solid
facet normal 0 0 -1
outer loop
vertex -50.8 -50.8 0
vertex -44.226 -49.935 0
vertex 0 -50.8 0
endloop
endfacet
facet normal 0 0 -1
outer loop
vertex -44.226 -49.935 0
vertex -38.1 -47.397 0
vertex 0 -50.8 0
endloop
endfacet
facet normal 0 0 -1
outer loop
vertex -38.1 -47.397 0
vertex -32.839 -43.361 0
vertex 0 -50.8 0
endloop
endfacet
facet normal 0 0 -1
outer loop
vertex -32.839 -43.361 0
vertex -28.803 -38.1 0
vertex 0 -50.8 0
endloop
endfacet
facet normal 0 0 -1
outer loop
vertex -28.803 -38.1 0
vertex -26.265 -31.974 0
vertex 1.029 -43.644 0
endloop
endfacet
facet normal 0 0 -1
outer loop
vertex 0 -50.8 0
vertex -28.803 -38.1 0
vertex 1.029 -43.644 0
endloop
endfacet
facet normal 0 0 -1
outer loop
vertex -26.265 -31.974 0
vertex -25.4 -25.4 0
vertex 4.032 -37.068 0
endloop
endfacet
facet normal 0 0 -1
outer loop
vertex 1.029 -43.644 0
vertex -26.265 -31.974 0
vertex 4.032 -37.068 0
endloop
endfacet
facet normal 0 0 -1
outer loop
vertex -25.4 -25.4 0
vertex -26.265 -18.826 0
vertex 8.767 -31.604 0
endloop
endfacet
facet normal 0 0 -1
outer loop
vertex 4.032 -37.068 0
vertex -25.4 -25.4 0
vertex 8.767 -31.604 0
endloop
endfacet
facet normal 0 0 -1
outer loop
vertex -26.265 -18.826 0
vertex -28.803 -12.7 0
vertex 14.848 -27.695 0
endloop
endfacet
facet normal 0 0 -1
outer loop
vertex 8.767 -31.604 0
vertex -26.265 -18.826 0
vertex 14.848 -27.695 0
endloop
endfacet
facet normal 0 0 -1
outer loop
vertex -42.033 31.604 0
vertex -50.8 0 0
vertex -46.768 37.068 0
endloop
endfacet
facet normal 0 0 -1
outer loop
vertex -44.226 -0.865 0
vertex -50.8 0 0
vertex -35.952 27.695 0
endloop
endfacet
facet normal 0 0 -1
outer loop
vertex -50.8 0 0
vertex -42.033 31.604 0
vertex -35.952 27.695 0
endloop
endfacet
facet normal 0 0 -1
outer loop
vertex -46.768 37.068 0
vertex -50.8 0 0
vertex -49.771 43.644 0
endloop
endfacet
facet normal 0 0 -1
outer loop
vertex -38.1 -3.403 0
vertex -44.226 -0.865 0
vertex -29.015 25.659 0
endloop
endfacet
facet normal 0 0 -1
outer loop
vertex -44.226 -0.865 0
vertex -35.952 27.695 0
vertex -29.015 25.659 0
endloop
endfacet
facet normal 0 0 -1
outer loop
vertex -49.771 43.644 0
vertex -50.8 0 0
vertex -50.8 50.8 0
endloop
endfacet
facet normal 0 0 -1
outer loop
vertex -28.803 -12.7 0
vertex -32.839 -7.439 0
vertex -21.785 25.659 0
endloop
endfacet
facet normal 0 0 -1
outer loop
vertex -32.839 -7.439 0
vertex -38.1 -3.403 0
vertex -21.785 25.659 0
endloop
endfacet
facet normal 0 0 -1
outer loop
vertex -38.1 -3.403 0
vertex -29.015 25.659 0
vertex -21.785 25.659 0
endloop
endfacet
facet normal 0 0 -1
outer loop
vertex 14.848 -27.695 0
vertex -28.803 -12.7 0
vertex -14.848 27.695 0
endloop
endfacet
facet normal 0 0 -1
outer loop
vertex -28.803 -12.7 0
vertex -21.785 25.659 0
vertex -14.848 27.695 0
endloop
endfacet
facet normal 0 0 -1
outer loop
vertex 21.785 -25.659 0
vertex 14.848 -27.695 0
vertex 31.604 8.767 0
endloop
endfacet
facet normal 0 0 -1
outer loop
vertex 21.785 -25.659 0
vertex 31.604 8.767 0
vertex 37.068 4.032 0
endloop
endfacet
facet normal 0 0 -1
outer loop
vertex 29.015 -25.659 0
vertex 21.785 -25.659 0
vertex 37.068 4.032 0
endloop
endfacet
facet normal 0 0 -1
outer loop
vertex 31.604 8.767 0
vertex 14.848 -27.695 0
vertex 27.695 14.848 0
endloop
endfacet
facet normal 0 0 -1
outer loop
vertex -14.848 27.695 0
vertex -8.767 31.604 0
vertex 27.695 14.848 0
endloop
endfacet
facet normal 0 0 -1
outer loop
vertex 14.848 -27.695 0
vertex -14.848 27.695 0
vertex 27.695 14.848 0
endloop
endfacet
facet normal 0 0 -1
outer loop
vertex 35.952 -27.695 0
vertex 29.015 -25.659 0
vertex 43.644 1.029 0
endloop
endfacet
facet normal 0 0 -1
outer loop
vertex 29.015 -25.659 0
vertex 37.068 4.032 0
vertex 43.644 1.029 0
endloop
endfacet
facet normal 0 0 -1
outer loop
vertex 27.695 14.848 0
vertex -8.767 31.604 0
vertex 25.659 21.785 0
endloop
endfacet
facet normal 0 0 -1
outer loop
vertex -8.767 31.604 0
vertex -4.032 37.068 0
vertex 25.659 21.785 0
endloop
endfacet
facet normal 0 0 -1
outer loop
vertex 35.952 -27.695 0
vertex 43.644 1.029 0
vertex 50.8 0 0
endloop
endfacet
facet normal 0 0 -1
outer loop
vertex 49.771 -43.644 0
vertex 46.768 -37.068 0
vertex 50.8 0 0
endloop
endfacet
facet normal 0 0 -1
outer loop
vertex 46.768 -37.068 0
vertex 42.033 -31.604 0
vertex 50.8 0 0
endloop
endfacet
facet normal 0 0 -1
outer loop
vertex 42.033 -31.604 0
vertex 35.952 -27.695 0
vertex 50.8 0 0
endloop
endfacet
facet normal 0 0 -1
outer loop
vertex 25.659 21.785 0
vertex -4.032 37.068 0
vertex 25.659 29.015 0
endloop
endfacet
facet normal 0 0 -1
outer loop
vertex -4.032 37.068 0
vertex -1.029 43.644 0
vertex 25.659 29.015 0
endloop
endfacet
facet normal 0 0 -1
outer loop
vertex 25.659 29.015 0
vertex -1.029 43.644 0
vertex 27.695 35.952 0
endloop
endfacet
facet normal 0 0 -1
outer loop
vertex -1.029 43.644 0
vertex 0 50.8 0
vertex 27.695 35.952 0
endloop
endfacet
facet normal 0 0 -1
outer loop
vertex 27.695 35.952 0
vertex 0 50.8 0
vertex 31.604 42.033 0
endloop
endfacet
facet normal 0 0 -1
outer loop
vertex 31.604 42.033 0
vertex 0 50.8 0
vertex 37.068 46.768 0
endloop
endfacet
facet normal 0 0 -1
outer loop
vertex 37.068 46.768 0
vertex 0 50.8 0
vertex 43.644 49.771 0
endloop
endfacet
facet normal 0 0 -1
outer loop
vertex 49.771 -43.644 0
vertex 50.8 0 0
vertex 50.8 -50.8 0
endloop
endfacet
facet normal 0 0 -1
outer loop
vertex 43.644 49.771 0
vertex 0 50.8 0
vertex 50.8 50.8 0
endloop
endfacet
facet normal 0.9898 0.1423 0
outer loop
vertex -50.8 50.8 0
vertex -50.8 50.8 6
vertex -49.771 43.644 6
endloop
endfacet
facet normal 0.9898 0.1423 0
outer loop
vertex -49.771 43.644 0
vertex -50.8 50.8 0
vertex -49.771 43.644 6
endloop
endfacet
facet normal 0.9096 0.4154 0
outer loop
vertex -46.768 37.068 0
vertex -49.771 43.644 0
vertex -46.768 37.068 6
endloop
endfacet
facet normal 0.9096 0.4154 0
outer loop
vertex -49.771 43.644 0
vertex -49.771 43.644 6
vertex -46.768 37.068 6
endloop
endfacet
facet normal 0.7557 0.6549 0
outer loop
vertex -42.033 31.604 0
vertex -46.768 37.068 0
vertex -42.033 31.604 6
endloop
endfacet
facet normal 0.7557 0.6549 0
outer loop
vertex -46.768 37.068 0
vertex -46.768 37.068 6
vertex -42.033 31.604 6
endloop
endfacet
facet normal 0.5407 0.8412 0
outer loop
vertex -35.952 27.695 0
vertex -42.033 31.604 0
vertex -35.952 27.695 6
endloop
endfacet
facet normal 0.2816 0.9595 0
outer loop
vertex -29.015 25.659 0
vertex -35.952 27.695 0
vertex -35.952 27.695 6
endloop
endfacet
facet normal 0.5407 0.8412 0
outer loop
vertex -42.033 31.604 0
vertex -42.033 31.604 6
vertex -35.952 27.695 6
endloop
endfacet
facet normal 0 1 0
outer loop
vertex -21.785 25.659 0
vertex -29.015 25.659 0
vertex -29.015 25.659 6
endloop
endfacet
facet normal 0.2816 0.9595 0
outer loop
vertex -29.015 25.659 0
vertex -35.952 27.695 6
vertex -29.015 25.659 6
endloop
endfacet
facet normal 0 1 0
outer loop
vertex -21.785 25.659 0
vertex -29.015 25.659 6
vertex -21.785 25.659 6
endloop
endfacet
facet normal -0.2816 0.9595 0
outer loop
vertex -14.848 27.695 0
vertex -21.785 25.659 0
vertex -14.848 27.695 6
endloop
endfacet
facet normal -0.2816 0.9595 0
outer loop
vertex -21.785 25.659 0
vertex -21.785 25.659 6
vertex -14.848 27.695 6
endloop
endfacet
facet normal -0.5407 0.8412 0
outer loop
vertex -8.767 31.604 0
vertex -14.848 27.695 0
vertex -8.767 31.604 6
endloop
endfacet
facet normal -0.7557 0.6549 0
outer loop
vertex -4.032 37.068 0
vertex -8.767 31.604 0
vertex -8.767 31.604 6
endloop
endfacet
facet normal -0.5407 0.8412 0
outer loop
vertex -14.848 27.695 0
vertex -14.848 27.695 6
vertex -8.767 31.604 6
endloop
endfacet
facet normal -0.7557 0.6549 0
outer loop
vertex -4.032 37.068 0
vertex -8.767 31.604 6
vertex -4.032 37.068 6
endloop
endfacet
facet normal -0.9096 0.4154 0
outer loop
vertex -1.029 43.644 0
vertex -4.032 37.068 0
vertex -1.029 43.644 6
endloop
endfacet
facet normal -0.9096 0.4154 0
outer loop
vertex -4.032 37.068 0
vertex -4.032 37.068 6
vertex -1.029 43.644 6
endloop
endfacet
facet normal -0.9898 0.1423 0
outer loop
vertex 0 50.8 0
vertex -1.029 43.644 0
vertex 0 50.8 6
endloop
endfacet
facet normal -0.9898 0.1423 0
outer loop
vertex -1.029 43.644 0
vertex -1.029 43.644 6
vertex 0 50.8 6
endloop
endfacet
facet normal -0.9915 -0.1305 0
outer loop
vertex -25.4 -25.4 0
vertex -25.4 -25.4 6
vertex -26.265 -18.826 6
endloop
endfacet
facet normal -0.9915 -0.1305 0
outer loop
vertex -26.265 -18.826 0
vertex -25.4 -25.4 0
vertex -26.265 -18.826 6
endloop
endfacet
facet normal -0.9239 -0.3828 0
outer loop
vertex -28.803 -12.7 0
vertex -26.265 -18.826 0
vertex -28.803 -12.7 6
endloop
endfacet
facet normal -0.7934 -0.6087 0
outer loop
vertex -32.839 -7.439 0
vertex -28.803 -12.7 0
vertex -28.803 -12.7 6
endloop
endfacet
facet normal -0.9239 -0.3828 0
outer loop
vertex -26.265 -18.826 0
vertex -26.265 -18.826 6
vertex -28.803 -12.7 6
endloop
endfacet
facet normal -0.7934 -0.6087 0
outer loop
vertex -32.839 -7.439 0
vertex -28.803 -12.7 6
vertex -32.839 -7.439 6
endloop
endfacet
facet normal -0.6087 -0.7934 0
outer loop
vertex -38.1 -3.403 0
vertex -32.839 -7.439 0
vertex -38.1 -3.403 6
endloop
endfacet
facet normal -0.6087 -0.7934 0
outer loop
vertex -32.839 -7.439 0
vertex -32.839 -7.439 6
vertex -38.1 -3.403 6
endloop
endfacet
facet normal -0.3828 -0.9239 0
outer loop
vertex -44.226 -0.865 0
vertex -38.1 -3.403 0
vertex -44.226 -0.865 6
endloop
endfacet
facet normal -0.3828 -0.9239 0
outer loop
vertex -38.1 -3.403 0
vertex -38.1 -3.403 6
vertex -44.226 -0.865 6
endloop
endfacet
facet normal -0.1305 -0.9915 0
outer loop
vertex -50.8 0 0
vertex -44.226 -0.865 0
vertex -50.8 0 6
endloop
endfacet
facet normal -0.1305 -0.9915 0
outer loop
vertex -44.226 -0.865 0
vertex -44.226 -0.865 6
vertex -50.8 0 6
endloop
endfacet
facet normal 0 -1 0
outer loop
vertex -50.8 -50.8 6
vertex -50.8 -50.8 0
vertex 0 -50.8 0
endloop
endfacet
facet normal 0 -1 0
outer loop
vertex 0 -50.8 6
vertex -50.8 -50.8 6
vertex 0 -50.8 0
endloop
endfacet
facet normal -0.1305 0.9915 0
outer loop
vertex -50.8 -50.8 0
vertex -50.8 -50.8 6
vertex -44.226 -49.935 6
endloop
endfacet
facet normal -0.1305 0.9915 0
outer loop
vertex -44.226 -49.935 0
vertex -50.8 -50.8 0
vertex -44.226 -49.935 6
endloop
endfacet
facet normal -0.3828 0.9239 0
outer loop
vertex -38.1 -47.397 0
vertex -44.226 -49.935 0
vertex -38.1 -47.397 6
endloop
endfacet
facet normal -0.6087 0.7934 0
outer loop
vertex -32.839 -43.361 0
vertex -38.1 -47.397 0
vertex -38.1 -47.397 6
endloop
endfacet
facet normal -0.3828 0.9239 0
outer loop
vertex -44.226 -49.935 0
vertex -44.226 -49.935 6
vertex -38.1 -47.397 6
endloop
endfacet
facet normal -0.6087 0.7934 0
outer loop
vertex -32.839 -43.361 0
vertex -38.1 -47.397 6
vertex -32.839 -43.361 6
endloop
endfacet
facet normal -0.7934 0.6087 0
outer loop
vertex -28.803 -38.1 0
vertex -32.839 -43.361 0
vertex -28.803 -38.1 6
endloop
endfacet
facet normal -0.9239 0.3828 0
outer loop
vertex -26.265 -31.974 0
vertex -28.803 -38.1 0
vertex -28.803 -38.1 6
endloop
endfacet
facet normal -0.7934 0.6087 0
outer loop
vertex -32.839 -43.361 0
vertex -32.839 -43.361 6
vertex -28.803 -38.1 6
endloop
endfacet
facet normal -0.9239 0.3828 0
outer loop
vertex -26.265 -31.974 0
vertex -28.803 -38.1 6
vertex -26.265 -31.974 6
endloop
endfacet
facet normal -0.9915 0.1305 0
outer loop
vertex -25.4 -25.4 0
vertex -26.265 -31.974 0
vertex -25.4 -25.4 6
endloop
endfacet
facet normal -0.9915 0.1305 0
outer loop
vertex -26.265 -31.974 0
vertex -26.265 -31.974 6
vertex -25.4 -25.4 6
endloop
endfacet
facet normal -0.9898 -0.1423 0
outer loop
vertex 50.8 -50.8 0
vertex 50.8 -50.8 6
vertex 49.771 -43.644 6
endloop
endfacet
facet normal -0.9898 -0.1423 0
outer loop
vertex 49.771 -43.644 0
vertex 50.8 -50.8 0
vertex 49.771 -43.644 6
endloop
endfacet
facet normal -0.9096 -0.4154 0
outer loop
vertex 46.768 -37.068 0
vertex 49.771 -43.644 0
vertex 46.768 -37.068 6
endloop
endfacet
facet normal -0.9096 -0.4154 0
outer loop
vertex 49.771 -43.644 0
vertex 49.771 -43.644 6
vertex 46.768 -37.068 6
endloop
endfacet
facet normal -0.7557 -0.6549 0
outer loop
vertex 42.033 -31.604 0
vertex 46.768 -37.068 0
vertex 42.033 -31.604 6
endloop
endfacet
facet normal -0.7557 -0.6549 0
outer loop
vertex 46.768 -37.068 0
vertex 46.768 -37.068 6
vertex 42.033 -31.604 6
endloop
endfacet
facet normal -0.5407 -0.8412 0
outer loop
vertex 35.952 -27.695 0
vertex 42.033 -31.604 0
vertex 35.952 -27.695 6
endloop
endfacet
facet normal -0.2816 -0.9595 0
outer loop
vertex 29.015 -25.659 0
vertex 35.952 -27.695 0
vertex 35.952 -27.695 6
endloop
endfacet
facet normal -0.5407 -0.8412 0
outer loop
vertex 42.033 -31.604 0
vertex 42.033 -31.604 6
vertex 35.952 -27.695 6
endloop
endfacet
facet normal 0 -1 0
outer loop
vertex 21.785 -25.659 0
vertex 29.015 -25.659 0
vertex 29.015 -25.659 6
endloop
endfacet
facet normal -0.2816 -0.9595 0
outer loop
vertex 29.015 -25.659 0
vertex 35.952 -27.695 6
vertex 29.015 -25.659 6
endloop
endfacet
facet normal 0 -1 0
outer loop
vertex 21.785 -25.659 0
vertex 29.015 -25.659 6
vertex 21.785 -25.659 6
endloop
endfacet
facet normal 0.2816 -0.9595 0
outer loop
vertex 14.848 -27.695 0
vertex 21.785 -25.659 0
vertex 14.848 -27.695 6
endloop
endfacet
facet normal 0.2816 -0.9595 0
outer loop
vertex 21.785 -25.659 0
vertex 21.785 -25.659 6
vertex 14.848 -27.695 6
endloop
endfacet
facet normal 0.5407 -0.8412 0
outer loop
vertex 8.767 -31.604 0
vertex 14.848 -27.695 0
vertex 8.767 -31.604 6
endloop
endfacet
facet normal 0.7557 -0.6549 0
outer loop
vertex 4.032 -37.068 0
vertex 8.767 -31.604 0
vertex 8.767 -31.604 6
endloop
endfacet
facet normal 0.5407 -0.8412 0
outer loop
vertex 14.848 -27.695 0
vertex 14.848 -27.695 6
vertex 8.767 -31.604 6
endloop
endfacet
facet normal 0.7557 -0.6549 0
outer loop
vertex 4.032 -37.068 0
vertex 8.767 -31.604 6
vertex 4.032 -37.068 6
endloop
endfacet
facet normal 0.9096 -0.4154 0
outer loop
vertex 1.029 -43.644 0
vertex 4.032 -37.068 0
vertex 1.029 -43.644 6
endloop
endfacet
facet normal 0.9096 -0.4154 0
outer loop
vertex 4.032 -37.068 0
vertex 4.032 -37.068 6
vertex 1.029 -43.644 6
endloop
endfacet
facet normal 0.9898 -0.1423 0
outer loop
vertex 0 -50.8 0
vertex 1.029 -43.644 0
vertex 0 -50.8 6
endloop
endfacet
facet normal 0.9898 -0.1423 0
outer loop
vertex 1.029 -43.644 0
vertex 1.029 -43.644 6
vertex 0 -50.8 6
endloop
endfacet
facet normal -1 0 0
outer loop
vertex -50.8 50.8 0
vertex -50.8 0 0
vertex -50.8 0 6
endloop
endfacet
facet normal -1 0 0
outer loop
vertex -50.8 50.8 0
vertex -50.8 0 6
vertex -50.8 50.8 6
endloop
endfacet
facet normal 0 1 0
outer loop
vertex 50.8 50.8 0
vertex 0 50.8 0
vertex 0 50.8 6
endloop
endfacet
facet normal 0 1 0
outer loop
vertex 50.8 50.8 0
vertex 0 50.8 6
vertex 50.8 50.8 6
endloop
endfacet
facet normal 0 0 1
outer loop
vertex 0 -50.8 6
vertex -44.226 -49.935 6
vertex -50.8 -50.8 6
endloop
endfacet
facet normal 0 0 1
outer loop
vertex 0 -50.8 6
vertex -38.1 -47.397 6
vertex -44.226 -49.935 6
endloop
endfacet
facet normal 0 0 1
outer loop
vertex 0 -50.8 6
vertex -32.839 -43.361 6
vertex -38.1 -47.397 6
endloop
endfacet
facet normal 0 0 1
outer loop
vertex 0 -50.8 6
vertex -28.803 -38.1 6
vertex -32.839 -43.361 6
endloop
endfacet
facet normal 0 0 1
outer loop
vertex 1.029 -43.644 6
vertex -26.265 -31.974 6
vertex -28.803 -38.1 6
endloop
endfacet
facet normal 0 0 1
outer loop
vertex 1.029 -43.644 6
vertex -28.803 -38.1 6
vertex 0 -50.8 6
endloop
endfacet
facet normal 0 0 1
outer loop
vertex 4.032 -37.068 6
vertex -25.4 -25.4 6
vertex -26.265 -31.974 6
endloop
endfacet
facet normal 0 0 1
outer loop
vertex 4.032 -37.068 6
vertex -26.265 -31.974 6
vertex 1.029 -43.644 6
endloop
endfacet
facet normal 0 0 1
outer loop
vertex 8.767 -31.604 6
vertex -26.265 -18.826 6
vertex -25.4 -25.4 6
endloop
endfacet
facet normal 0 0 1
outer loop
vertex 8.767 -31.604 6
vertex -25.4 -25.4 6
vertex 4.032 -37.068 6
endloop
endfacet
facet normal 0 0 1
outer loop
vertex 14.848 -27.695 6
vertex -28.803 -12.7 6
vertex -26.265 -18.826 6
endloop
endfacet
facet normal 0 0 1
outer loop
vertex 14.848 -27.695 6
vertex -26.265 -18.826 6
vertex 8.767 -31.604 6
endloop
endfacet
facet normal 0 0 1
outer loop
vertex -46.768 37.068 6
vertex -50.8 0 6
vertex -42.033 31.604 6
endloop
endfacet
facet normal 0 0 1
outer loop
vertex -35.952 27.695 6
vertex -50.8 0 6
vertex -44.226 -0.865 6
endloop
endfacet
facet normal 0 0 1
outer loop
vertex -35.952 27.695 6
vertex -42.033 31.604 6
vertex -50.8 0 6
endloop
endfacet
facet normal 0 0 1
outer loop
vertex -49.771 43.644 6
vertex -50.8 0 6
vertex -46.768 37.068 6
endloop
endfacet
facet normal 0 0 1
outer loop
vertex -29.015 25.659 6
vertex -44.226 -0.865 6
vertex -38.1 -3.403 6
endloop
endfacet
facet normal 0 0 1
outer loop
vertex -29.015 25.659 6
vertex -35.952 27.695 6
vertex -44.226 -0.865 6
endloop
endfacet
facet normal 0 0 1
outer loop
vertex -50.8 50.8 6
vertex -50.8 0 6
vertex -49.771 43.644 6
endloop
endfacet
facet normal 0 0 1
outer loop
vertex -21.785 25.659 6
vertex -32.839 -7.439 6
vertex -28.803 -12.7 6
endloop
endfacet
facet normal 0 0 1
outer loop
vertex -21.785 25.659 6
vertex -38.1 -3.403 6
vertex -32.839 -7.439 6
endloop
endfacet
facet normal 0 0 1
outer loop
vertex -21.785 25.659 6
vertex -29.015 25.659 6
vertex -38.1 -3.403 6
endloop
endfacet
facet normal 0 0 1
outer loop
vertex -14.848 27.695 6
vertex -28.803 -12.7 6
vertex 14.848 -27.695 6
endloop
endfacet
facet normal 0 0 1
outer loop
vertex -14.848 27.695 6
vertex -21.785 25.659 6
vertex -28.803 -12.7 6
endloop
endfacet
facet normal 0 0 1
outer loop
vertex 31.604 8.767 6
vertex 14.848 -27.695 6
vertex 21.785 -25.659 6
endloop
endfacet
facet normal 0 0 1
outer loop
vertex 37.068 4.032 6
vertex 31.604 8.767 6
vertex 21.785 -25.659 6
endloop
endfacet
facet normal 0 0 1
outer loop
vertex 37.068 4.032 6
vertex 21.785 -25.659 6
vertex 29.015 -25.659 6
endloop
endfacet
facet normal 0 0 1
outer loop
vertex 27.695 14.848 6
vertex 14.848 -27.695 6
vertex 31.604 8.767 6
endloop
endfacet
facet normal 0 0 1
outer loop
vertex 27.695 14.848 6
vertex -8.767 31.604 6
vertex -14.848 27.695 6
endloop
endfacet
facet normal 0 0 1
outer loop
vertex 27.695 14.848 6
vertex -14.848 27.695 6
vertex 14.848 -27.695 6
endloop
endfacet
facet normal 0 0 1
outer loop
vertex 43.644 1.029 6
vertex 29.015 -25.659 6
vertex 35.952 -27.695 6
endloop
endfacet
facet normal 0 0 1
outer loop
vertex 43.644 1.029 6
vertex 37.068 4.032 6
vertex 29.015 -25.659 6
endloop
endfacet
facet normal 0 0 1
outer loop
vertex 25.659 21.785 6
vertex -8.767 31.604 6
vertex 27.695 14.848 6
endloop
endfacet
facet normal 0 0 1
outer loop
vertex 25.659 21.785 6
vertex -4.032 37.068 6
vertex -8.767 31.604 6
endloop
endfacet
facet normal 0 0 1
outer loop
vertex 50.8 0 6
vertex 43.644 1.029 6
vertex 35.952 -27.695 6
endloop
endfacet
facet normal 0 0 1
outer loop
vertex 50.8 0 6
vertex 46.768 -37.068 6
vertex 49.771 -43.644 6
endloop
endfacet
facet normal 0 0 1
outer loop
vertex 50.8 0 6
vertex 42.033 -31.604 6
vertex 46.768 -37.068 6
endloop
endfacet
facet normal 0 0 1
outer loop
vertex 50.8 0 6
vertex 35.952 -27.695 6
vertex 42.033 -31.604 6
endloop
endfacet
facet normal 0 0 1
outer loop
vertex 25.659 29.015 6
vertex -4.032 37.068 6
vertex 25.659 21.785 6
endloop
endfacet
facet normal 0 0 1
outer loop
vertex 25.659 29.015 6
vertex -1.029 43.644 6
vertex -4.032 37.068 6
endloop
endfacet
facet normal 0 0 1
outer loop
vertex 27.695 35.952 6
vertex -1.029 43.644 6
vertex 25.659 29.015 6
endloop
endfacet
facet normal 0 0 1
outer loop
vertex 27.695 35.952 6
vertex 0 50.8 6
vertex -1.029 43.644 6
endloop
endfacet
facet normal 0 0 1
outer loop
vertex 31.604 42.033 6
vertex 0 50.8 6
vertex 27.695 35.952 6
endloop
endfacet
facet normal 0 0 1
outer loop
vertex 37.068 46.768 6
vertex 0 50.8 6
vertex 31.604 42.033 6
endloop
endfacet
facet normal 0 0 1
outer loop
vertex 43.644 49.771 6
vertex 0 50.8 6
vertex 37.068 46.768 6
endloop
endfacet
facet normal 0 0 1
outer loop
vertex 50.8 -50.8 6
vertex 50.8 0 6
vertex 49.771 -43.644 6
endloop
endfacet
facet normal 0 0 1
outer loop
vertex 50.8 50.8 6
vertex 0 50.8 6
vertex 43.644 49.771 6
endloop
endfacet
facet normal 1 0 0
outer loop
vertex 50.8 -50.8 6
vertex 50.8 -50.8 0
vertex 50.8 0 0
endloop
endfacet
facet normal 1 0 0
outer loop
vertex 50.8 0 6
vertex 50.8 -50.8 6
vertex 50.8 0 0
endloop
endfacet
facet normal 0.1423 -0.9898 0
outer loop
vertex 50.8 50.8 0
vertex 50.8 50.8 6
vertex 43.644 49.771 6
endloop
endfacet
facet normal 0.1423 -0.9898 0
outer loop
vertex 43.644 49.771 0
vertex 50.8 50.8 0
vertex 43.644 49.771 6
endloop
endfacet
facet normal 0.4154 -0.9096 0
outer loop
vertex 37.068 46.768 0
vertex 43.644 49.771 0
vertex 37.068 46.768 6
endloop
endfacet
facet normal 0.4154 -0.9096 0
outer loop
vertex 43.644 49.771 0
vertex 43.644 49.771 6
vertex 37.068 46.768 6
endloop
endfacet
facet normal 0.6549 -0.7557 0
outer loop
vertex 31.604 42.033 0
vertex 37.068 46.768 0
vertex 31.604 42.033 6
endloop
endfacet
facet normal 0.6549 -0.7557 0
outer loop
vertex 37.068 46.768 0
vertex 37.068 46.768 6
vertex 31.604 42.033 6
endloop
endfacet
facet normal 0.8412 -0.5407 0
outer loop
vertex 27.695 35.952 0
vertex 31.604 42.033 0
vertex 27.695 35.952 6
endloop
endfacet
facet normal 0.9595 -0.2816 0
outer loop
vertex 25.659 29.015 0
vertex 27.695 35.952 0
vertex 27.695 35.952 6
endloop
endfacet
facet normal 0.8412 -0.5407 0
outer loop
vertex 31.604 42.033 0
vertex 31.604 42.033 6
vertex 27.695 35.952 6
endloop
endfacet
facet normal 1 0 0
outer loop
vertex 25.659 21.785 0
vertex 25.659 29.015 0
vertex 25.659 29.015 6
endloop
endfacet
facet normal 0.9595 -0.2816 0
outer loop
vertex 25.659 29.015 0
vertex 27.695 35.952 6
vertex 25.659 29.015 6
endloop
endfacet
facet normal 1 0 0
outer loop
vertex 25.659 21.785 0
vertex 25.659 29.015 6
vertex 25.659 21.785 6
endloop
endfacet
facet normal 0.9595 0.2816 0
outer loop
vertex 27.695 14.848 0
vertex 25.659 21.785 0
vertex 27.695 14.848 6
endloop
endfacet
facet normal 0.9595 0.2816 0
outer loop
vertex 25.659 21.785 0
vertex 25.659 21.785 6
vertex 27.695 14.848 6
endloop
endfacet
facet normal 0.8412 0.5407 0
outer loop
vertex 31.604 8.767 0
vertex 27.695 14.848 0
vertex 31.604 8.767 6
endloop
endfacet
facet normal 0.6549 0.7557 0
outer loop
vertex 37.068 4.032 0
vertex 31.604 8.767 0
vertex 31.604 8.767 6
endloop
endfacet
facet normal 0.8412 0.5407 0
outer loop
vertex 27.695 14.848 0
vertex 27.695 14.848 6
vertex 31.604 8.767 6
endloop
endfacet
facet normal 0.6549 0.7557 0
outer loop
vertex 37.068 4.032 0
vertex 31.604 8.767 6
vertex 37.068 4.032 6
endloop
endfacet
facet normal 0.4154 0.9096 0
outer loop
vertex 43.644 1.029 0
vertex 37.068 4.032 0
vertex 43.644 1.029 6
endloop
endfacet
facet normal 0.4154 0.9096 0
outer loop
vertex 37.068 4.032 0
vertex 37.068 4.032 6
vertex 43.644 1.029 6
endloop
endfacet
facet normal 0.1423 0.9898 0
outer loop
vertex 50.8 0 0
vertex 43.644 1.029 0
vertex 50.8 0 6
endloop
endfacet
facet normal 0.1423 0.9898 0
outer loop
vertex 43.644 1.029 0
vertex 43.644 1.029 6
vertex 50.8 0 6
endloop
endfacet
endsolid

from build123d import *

# Parameters (mm, degrees)
F0_W     = 101.6
F0_H     = 101.6
F1_DEPTH = 6
F3_DEPTH = 6.35


with BuildPart() as f1:
    # F0 (on Top) → F1 (new body)
    with BuildSketch(Plane.XY):
        Rectangle(F0_W, F0_H)
    extrude(amount=F1_DEPTH)

    # F2 (on face) → F3 (cut)
    with BuildSketch(Plane.XY.offset(6)):
        with BuildLine():
            ThreePointArc((-25.4, -25.4), (-32.8394877579, -7.4394877579), (-50.8, 0))
            Line((-50.8, 0), (-50.8, -50.8))
            ThreePointArc((-50.8, -50.8), (-32.8394877579, -43.3605122421), (-25.4, -25.4))
        make_face()
        with BuildLine():
            ThreePointArc((-50.8, 50.8), (-25.4, 25.4), (0, 50.8))
            Line((0, 50.8), (-50.8, 50.8))
        make_face()
        with BuildLine():
            Line((50.8, 0), (50.8, 50.8))
            ThreePointArc((50.8, 50.8), (25.4, 25.4), (50.8, 0))
        make_face()
        with BuildLine():
            Line((0, -50.8), (50.8, -50.8))
            ThreePointArc((50.8, -50.8), (25.4, -25.4), (0, -50.8))
        make_face()
    extrude(amount=-F3_DEPTH, mode=Mode.SUBTRACT)


solid = f1.part
